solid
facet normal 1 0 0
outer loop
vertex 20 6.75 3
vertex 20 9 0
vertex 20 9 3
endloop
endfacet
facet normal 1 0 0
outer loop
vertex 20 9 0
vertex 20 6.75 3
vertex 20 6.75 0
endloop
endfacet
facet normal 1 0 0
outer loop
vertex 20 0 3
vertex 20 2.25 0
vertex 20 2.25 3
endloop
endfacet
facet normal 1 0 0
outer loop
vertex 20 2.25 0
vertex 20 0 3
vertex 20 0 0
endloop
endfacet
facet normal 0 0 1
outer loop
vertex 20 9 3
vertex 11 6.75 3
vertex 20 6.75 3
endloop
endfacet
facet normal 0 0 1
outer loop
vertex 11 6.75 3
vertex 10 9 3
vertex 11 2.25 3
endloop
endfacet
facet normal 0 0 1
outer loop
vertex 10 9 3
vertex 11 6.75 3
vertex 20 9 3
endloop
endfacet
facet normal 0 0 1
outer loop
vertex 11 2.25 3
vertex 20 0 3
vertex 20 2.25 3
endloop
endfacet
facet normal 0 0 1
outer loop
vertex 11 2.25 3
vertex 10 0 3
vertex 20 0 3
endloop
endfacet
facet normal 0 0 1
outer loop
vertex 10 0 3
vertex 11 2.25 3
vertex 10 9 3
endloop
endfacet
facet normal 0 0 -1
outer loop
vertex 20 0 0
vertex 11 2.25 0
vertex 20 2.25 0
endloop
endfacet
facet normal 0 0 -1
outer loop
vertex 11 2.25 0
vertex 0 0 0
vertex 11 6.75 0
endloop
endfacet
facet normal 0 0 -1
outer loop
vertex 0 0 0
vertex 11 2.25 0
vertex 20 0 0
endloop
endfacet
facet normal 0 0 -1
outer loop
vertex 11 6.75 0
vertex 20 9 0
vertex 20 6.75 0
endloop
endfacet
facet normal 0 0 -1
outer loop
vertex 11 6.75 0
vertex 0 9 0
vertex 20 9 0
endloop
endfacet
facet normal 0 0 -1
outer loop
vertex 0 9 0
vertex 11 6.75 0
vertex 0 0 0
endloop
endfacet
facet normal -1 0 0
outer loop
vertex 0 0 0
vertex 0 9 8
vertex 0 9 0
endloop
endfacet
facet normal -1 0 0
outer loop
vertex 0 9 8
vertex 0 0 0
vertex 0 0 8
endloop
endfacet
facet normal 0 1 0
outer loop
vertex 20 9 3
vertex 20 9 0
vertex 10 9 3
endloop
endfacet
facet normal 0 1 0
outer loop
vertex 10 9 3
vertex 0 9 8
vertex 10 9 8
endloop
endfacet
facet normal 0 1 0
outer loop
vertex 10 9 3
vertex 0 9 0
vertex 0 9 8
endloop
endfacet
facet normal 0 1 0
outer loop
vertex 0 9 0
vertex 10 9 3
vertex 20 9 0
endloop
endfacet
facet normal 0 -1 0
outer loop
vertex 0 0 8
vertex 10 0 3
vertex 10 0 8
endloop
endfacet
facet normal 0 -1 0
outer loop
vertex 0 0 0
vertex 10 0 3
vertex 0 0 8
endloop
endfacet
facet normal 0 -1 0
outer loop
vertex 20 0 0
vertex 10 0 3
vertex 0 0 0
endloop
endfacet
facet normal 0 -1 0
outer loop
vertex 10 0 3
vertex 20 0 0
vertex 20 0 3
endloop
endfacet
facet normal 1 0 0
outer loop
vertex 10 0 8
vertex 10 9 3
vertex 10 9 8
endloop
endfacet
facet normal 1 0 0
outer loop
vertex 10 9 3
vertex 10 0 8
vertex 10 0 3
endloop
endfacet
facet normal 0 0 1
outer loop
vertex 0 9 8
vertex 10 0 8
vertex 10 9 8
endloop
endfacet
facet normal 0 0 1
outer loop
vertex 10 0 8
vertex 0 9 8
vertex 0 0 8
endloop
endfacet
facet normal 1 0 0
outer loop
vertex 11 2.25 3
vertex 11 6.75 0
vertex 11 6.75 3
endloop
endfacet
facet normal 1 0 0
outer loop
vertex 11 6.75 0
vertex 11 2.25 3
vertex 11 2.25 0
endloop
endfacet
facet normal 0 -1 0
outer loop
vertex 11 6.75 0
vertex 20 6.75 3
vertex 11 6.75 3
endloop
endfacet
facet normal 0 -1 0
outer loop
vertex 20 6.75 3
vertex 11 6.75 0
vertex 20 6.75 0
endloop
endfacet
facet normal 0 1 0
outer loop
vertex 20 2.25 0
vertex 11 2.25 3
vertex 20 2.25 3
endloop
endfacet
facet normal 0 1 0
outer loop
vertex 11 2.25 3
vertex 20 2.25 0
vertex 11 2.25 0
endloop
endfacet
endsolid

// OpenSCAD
difference(){
	union(){
        translate([0,0,0]){
          cube([20,9,3], center=false);
        }      
        translate([0,0,0]){
          cube([10,9,8], center=false);
        }      
        
	}
	union() {
       translate([11,2.25,-40]){
          cube([10,4.5,80], center=false);
       }	
        
	}
}
